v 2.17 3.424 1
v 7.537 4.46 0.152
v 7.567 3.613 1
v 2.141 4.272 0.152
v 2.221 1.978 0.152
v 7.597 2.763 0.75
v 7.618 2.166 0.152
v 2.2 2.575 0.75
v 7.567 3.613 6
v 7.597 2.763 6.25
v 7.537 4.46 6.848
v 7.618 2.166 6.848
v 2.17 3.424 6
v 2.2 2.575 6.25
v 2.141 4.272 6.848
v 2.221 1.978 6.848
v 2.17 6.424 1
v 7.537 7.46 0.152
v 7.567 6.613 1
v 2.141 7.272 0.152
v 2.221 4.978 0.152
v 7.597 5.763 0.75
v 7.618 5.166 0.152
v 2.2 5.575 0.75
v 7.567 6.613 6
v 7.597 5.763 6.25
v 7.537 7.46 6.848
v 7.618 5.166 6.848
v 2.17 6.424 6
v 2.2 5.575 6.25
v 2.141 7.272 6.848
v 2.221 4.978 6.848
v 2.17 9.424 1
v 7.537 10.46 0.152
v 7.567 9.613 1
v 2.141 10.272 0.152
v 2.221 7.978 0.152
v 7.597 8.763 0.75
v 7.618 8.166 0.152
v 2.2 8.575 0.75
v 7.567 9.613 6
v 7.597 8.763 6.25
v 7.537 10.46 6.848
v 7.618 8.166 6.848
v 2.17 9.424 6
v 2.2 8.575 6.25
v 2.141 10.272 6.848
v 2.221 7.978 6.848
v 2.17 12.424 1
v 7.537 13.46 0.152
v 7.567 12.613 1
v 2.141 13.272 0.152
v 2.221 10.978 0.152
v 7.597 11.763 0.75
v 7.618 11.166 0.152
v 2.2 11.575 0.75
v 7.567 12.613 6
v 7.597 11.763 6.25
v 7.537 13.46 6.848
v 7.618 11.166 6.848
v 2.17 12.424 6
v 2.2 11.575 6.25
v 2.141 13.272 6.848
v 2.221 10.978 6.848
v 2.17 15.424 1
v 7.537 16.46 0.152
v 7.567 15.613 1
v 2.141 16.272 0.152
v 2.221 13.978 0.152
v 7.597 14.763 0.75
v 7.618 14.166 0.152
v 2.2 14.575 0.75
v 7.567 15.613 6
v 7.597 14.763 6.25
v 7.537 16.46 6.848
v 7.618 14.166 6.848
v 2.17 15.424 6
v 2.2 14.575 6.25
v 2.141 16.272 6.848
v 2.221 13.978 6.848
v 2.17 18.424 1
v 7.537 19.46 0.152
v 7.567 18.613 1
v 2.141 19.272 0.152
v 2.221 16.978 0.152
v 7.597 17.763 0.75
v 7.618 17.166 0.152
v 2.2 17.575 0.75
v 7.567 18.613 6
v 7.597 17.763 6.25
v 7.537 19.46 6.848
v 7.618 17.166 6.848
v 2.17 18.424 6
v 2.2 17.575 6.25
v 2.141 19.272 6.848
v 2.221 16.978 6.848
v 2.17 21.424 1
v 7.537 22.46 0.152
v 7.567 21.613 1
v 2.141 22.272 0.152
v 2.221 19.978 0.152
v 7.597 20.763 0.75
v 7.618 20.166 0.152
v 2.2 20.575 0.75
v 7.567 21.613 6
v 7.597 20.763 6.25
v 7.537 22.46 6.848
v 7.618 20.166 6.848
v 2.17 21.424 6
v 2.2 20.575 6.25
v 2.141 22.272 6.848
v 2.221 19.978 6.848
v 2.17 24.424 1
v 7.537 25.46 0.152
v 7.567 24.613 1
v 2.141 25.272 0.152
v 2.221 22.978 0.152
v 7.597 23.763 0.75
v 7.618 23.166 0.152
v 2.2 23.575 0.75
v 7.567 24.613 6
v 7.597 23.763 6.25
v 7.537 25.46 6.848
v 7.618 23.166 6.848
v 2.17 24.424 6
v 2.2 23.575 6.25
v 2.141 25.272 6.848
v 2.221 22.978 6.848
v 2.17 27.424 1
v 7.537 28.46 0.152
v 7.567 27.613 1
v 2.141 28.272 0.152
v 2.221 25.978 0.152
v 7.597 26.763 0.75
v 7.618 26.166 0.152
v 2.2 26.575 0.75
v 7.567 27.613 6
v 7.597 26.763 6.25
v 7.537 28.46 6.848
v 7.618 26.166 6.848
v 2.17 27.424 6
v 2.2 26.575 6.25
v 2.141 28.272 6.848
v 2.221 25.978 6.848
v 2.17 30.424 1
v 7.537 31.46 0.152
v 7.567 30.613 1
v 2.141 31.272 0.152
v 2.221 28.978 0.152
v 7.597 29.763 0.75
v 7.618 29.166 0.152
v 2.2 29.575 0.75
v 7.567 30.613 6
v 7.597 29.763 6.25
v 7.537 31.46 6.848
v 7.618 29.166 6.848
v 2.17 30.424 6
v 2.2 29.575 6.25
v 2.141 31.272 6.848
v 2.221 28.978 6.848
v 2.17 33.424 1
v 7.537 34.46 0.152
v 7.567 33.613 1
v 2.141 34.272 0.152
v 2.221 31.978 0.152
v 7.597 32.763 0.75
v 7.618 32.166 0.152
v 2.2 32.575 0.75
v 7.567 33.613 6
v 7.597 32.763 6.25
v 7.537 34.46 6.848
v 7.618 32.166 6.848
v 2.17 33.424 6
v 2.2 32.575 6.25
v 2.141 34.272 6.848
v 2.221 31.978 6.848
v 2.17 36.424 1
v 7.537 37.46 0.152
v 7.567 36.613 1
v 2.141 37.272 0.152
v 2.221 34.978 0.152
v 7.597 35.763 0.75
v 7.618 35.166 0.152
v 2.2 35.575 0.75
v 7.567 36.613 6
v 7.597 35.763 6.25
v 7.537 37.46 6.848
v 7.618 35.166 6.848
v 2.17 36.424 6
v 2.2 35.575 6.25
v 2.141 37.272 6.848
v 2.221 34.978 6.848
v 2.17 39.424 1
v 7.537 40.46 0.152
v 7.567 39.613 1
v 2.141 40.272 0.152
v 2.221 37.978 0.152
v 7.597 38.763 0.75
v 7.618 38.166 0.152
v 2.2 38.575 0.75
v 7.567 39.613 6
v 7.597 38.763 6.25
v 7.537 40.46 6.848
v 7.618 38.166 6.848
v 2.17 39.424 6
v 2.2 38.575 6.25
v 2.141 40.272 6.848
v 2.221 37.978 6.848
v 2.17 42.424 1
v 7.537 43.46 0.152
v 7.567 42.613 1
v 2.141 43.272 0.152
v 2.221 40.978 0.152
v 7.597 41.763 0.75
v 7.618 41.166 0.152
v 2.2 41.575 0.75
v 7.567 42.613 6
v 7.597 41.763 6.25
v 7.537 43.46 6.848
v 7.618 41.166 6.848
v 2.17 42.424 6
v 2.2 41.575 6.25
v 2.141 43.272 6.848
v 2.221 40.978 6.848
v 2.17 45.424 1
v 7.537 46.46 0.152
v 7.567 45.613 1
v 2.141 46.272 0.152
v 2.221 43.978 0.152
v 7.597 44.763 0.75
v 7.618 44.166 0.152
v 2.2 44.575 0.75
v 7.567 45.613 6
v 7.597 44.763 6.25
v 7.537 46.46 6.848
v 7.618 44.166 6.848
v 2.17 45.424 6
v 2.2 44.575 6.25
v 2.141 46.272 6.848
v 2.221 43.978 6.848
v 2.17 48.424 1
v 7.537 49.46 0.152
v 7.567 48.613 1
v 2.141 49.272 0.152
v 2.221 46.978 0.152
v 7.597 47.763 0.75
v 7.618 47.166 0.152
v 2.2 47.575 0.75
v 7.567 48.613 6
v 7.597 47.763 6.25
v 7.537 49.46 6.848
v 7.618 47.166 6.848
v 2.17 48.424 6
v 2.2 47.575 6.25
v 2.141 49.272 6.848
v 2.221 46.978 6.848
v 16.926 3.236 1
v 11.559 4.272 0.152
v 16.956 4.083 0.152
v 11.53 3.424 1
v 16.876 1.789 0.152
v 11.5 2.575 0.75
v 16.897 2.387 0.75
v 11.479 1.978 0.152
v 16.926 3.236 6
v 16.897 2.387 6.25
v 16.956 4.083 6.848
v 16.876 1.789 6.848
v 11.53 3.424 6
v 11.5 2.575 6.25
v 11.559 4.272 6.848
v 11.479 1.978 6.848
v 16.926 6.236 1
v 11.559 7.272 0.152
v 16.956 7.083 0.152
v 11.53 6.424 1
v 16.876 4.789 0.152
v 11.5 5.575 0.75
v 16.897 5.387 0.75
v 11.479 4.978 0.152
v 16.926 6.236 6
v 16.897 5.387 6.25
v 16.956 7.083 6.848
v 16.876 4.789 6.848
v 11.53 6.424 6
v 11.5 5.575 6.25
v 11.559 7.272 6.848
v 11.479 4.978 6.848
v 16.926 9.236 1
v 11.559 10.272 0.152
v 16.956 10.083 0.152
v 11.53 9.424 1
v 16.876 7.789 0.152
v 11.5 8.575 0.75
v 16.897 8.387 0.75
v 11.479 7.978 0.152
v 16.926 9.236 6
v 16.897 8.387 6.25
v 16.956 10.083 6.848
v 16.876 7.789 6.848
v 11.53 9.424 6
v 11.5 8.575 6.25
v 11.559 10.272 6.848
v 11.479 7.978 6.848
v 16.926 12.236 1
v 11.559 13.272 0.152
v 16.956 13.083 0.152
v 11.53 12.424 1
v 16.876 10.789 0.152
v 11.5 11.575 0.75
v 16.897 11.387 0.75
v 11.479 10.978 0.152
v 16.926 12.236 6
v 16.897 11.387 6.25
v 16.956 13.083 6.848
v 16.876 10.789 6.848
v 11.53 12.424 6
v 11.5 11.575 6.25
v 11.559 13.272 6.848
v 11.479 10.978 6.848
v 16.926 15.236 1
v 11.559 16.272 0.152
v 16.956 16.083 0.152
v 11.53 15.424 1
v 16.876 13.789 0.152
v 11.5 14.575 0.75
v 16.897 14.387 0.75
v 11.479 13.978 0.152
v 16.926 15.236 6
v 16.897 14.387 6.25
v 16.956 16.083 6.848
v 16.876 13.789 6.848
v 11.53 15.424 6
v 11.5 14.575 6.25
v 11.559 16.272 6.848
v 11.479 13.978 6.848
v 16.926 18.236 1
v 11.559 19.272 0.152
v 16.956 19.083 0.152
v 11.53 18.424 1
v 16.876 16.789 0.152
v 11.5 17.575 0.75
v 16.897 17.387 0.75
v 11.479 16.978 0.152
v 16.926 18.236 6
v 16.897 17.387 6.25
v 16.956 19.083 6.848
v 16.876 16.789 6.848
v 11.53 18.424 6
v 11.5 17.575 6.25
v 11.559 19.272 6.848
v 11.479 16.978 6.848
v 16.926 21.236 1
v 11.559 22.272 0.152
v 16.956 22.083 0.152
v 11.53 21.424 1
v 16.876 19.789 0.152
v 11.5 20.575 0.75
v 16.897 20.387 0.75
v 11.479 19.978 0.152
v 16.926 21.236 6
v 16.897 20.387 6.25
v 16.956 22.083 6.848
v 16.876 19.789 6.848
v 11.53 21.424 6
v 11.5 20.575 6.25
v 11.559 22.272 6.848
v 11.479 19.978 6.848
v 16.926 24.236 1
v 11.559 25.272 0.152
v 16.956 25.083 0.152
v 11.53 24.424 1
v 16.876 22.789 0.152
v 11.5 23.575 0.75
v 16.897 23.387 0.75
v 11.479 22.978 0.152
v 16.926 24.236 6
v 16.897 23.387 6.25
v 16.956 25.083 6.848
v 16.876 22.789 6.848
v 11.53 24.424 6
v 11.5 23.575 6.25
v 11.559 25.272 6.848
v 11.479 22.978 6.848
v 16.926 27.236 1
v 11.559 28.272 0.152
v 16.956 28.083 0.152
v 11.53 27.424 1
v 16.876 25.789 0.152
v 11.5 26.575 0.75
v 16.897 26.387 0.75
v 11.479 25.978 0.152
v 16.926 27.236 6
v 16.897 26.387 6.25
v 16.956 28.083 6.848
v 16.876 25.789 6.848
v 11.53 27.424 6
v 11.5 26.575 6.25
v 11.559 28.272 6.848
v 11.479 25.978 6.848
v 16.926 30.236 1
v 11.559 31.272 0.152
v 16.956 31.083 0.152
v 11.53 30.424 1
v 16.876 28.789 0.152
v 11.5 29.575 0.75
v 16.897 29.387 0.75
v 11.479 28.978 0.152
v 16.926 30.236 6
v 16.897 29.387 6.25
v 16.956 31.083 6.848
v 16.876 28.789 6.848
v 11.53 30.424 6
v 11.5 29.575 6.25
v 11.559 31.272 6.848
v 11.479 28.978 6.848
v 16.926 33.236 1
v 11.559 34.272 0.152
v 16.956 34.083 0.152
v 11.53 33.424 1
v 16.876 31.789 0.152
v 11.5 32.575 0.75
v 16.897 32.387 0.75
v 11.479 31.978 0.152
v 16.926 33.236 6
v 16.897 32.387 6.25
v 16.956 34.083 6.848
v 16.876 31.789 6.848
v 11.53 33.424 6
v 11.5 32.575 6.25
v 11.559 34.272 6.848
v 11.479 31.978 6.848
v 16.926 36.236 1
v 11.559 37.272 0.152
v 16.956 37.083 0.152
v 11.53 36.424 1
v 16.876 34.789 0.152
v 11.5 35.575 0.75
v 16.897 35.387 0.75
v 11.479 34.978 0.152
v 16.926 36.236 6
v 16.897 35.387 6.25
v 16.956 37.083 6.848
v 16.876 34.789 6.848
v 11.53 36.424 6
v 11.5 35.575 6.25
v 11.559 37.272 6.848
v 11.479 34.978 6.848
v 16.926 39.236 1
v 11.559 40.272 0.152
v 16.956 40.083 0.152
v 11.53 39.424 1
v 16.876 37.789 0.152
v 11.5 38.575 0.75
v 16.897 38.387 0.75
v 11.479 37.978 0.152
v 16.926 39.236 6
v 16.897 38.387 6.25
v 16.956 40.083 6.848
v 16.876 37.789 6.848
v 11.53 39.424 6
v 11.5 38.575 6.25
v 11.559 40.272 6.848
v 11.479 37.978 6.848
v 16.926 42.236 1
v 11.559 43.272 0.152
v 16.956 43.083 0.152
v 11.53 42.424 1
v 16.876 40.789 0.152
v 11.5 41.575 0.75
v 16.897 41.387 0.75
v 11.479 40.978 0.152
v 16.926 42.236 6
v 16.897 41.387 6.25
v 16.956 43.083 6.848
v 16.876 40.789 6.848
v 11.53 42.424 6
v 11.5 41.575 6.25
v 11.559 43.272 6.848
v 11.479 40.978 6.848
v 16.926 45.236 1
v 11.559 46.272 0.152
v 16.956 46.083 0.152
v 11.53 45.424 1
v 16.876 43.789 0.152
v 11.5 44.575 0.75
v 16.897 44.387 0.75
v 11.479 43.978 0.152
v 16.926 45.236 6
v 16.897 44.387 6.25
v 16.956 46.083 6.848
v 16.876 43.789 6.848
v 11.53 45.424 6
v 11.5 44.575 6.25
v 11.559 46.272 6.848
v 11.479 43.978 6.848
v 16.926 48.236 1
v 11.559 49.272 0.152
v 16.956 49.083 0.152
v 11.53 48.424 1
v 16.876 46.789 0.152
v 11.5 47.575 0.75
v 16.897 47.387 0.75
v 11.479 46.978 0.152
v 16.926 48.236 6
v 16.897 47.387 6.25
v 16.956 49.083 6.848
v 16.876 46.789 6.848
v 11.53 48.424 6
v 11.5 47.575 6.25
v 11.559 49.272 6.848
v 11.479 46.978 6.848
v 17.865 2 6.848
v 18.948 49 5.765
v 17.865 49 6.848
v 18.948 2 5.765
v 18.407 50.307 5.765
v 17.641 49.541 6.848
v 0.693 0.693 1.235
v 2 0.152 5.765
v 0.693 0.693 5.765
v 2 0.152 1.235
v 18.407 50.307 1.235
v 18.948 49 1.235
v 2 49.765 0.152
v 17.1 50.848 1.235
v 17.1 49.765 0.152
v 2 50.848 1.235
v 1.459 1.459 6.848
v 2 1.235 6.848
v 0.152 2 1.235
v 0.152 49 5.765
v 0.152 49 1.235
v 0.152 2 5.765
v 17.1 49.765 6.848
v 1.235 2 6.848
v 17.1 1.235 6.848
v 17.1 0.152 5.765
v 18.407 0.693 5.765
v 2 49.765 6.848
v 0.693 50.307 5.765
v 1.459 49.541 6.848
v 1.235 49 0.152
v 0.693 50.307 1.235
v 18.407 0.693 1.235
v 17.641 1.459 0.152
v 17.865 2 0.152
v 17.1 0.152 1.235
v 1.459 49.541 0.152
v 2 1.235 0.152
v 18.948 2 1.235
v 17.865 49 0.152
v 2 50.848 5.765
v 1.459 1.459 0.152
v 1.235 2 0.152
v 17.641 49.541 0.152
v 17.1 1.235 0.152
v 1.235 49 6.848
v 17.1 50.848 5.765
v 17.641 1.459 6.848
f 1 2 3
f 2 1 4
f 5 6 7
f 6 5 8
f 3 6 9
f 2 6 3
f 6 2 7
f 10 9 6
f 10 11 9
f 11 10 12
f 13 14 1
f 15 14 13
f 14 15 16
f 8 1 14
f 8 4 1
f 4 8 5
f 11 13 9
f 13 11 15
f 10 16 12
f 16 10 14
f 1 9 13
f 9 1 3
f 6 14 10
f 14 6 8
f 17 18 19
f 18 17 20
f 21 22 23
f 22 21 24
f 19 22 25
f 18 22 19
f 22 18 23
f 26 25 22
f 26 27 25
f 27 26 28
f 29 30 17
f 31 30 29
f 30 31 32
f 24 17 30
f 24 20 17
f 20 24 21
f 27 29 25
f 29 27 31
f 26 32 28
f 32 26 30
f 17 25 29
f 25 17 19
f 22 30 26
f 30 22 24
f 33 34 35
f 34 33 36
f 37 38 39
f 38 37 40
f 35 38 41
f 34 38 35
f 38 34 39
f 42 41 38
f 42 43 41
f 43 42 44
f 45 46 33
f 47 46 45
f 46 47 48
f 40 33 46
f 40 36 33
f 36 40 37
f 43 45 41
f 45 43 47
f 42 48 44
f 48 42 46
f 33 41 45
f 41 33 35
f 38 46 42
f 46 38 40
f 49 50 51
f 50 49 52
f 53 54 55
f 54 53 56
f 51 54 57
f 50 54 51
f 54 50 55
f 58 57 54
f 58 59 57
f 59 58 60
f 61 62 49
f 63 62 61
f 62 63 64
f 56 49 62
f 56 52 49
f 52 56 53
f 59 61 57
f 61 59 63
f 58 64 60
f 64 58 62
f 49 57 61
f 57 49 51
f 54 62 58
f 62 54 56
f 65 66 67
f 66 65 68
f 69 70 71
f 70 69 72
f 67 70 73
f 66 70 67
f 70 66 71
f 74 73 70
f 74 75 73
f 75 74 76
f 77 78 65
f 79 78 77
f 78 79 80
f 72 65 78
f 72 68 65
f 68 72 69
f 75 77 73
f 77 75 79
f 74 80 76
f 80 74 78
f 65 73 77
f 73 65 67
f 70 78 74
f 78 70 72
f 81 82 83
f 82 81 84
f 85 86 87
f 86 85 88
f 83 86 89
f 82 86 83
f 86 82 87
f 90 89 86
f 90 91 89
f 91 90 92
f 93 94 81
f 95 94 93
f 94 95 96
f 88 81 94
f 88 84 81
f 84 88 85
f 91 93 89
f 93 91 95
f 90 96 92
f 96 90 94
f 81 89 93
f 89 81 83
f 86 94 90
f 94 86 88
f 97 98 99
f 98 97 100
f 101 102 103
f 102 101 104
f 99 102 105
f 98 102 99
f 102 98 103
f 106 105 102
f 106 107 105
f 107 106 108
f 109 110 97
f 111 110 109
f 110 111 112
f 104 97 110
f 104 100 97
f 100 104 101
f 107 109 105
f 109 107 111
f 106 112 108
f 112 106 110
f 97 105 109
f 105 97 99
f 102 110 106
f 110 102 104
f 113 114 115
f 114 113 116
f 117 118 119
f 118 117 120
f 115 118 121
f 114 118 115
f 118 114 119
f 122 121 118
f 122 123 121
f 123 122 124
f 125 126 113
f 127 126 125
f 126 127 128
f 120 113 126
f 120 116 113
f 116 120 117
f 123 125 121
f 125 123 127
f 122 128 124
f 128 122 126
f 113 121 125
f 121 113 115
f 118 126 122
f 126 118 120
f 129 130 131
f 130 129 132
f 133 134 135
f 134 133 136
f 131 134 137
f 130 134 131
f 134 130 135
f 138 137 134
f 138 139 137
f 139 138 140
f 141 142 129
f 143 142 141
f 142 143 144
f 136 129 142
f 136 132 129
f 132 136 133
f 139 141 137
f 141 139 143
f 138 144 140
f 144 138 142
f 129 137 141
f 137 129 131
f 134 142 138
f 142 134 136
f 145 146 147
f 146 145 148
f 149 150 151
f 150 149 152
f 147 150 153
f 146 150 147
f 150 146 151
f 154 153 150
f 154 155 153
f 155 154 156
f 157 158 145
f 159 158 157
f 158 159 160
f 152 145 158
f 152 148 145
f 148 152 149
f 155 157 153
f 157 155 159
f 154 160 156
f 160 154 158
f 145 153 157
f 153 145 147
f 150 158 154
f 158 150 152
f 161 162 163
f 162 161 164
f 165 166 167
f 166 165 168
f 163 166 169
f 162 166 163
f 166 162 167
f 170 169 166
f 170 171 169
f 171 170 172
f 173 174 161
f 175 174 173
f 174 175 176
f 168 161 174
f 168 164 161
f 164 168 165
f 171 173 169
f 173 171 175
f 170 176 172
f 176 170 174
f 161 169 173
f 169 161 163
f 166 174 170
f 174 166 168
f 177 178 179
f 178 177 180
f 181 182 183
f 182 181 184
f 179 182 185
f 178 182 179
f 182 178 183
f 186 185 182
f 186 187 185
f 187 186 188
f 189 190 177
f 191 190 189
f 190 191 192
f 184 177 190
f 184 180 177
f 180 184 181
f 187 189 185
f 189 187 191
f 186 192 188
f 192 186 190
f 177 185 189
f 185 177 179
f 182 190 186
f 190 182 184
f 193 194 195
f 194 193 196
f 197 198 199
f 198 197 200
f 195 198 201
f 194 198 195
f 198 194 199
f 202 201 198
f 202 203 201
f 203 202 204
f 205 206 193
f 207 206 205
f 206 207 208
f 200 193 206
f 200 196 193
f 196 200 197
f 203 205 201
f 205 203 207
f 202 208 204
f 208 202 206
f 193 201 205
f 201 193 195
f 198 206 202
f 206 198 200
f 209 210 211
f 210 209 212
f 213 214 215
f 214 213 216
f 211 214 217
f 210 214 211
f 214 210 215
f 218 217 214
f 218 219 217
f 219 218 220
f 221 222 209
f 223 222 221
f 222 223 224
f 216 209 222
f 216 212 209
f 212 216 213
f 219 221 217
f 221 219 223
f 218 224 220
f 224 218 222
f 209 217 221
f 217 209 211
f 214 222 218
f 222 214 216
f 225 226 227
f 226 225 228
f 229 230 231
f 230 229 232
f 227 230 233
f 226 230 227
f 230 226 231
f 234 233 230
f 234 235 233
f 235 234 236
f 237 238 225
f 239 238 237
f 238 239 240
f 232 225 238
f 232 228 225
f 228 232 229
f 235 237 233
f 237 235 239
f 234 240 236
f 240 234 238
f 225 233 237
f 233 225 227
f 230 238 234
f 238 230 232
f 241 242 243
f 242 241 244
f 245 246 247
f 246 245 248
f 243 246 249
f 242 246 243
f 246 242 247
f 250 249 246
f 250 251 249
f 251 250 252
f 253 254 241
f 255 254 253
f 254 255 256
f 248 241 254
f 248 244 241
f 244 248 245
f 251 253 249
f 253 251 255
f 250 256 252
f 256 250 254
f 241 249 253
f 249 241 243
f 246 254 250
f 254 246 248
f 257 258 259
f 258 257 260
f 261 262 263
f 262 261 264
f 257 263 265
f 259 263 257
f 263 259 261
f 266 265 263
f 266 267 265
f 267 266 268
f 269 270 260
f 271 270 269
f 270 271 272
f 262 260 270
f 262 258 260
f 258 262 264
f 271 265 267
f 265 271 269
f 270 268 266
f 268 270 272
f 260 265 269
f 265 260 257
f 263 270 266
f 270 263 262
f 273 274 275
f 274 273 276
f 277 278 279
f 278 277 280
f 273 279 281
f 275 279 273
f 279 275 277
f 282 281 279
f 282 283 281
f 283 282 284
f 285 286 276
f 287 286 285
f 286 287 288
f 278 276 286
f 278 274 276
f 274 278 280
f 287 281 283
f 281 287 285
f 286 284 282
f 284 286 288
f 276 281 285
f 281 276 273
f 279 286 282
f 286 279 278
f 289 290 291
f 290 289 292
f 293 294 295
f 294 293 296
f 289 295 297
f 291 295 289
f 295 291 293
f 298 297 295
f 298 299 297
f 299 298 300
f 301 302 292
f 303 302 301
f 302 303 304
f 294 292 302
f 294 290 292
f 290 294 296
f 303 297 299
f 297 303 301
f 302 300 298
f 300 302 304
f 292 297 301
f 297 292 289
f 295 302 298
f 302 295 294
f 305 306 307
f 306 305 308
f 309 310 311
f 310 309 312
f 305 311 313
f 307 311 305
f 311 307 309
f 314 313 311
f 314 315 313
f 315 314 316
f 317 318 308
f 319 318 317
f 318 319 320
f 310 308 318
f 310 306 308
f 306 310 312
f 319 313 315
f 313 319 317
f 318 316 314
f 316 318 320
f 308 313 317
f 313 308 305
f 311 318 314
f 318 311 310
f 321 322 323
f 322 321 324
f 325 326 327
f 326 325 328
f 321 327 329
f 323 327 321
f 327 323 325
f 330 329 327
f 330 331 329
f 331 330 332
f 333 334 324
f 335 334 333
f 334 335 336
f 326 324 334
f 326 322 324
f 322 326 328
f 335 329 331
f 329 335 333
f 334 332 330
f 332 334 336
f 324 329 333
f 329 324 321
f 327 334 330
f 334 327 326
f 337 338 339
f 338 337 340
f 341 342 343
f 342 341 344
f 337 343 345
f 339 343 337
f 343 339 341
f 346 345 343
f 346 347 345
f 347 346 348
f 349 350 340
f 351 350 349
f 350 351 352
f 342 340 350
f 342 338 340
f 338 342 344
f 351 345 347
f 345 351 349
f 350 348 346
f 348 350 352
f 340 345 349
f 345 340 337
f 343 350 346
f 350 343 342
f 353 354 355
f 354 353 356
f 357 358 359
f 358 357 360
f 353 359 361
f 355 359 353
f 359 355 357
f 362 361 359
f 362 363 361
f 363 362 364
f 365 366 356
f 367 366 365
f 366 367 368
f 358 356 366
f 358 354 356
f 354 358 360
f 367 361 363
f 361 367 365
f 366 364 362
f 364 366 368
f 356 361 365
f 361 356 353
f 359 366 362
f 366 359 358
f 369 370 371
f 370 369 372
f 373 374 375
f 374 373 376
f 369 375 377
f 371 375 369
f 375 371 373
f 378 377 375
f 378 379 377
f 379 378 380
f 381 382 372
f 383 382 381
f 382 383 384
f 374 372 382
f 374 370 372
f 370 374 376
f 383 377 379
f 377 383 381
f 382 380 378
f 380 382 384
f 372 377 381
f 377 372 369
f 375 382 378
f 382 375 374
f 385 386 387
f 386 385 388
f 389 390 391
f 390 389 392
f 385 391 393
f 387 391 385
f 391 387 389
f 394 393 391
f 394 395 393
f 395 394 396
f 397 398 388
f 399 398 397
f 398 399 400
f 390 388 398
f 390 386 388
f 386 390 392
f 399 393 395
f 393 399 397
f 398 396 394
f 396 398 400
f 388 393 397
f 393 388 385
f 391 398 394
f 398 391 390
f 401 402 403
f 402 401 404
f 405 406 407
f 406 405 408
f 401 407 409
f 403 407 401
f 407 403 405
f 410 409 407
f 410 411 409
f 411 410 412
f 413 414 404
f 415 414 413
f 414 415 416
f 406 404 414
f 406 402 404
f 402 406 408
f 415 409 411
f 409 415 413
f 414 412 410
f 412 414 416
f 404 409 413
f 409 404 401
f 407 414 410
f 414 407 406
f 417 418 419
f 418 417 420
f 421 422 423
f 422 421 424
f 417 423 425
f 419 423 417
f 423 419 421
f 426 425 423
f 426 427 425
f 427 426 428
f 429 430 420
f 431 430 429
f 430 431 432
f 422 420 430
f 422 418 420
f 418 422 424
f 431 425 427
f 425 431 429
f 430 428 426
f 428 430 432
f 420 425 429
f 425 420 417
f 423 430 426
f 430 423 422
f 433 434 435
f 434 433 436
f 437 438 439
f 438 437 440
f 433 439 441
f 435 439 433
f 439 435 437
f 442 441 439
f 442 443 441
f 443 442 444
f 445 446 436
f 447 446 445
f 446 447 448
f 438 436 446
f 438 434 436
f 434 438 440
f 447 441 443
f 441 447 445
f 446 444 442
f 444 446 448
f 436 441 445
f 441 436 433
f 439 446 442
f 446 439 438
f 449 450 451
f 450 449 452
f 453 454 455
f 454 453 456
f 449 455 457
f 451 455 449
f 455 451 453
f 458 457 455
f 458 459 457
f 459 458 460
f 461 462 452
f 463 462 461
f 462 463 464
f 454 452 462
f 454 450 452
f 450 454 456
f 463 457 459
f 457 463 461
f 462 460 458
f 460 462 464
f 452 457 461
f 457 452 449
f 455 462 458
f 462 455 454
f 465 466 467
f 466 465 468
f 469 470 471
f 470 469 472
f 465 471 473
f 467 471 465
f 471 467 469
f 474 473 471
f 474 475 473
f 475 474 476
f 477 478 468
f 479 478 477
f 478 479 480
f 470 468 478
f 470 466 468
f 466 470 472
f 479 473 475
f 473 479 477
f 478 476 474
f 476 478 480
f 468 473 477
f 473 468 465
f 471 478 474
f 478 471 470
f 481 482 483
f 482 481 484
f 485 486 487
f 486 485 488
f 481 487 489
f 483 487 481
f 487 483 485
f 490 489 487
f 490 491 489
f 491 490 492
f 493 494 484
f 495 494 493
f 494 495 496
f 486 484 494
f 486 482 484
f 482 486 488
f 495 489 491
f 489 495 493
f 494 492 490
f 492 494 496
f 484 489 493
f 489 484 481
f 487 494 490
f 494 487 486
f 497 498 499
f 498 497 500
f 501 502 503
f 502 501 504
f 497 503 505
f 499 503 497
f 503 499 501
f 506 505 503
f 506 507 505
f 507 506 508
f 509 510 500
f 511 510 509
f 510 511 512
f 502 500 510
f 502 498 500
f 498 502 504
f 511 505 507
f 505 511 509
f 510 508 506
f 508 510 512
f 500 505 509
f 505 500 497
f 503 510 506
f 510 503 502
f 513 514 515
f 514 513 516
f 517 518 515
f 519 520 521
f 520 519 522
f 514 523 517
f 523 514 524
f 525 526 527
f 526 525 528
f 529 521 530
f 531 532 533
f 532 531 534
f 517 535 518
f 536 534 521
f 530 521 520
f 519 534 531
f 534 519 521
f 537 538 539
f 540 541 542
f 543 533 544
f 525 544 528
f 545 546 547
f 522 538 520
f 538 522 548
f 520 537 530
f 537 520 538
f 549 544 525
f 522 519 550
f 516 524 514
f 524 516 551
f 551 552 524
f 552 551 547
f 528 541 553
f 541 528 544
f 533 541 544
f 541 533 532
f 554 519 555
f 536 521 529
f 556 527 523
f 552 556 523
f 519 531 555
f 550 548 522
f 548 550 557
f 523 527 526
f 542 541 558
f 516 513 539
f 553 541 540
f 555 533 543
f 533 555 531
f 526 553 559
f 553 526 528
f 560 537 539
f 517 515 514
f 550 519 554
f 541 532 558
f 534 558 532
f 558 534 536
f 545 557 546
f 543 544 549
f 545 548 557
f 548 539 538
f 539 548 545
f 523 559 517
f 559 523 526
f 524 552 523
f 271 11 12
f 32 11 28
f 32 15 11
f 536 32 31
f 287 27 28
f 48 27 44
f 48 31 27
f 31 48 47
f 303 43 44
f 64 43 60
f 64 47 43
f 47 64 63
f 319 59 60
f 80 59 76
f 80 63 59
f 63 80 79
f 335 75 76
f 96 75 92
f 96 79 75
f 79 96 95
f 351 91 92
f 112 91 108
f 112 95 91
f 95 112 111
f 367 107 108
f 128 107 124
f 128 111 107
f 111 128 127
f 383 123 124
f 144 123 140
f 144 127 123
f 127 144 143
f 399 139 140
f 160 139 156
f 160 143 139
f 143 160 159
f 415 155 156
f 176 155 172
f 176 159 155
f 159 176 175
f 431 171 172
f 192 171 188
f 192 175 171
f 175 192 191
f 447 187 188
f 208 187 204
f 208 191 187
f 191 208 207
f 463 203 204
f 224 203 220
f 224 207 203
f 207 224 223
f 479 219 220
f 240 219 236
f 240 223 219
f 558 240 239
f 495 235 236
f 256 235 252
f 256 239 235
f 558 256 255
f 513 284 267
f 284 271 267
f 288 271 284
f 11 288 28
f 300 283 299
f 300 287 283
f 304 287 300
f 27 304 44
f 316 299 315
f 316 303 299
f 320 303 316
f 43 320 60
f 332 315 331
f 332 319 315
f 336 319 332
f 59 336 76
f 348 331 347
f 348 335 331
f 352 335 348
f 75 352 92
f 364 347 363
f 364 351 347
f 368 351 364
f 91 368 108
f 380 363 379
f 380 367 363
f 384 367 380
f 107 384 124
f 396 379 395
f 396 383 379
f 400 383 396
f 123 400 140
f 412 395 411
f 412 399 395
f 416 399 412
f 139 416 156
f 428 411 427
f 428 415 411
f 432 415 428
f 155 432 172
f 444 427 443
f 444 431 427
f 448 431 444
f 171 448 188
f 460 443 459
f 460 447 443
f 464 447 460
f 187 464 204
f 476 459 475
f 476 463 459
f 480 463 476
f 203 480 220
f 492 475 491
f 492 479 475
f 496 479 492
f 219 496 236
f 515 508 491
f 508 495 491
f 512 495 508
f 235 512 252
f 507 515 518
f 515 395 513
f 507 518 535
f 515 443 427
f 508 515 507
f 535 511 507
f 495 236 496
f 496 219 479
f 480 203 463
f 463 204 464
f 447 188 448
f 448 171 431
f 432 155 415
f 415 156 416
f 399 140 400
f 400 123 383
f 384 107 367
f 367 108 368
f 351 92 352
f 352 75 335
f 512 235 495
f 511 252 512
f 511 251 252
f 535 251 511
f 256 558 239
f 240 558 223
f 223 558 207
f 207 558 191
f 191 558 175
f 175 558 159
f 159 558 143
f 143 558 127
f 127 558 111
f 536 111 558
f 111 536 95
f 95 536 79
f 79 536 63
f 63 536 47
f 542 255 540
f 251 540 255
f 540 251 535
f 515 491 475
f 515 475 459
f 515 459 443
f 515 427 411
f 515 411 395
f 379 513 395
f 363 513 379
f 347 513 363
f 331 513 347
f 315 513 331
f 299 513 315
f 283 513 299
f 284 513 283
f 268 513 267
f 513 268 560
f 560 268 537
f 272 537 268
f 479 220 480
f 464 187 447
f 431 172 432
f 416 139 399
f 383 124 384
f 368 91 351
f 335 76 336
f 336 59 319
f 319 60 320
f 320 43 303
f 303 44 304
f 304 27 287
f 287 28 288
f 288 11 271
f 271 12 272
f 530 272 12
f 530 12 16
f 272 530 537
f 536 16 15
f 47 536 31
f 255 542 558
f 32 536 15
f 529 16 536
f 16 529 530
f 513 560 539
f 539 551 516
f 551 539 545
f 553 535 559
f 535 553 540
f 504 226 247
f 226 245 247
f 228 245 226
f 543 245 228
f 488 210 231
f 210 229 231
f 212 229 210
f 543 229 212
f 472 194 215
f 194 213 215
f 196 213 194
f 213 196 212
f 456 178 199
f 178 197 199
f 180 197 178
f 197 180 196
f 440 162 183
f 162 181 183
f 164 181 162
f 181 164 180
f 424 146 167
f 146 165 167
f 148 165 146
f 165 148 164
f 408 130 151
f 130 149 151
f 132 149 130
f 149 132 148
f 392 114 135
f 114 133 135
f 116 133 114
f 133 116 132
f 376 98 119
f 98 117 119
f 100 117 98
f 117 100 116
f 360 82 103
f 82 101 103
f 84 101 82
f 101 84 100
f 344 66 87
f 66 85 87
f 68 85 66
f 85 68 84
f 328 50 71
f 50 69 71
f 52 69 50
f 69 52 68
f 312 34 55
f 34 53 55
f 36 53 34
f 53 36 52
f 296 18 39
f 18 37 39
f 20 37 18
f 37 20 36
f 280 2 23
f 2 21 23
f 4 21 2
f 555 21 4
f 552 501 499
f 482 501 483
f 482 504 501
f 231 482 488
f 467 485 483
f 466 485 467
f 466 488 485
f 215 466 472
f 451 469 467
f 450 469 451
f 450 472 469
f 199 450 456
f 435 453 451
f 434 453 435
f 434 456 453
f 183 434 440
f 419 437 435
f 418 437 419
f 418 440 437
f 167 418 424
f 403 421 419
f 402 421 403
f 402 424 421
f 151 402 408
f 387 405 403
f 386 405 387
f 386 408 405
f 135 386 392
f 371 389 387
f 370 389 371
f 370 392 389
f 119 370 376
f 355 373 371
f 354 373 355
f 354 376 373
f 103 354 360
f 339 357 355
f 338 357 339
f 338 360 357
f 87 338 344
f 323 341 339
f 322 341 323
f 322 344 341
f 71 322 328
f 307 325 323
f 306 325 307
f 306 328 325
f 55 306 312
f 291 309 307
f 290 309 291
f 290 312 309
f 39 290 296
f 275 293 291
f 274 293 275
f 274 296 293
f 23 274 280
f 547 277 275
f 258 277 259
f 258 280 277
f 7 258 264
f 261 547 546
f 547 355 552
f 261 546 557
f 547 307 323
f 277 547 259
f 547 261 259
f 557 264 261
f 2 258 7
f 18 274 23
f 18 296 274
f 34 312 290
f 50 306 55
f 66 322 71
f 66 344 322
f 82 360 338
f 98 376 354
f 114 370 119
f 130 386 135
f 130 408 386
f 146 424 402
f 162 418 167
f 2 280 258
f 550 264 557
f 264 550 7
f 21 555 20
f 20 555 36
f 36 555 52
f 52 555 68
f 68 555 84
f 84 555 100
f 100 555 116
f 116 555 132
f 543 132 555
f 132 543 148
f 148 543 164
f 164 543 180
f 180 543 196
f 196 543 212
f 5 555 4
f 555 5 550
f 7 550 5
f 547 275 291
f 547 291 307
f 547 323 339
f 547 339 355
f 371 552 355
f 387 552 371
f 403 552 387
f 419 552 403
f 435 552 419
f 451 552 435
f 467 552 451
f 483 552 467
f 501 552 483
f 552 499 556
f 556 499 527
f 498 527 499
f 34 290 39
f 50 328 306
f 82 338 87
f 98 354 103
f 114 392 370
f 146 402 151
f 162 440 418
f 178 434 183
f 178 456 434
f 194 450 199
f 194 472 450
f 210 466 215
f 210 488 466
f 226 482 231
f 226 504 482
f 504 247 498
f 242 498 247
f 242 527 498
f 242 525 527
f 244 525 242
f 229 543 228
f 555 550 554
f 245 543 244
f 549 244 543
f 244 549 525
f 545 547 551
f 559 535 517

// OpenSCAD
count = 16;
/*[Advanced]*/
step = 3;
fuseThin=0.65;
flapWidth=5.2;
fuseWidth = 19.1;
gap=0.1;
flapsSpace=4.1;
holderHeight=7;
angleGap = -2;

corner = 2;

xMax = fuseWidth;
yMax = (count+1)*step;
zMax = holderHeight;

difference(){
  roundedCube(xMax,yMax,zMax);

  translate([(fuseWidth - 2*flapWidth - flapsSpace)/2 - gap, step - gap - fuseThin/2, 0])
  union()
    for(i = [0,flapWidth + flapsSpace]) 
			for(j = [0 : count-1])
        translate([i,j*step,0])					
          rotate([0,0,(i>0)?angleGap:-angleGap]) union(){
						cube([flapWidth + 2*gap, fuseThin + 2*gap, holderHeight ]);
						for(k = [0, holderHeight])
							translate([0,fuseThin-gap,k])
								rotate([0,90,0])
									cylinder(d = fuseThin*4, h = flapWidth + 2*gap, $fn=4);
					}
}

module roundedCube(x,y,z){
	translate([corner, corner, corner])
	hull(){
		for(a=[0,x-2*corner])
			for(b=[0,y-2*corner])
				for(c=[0,z-2*corner])
					translate([a,b,c]) sphere(r=corner, $fn=8);
	}
}
